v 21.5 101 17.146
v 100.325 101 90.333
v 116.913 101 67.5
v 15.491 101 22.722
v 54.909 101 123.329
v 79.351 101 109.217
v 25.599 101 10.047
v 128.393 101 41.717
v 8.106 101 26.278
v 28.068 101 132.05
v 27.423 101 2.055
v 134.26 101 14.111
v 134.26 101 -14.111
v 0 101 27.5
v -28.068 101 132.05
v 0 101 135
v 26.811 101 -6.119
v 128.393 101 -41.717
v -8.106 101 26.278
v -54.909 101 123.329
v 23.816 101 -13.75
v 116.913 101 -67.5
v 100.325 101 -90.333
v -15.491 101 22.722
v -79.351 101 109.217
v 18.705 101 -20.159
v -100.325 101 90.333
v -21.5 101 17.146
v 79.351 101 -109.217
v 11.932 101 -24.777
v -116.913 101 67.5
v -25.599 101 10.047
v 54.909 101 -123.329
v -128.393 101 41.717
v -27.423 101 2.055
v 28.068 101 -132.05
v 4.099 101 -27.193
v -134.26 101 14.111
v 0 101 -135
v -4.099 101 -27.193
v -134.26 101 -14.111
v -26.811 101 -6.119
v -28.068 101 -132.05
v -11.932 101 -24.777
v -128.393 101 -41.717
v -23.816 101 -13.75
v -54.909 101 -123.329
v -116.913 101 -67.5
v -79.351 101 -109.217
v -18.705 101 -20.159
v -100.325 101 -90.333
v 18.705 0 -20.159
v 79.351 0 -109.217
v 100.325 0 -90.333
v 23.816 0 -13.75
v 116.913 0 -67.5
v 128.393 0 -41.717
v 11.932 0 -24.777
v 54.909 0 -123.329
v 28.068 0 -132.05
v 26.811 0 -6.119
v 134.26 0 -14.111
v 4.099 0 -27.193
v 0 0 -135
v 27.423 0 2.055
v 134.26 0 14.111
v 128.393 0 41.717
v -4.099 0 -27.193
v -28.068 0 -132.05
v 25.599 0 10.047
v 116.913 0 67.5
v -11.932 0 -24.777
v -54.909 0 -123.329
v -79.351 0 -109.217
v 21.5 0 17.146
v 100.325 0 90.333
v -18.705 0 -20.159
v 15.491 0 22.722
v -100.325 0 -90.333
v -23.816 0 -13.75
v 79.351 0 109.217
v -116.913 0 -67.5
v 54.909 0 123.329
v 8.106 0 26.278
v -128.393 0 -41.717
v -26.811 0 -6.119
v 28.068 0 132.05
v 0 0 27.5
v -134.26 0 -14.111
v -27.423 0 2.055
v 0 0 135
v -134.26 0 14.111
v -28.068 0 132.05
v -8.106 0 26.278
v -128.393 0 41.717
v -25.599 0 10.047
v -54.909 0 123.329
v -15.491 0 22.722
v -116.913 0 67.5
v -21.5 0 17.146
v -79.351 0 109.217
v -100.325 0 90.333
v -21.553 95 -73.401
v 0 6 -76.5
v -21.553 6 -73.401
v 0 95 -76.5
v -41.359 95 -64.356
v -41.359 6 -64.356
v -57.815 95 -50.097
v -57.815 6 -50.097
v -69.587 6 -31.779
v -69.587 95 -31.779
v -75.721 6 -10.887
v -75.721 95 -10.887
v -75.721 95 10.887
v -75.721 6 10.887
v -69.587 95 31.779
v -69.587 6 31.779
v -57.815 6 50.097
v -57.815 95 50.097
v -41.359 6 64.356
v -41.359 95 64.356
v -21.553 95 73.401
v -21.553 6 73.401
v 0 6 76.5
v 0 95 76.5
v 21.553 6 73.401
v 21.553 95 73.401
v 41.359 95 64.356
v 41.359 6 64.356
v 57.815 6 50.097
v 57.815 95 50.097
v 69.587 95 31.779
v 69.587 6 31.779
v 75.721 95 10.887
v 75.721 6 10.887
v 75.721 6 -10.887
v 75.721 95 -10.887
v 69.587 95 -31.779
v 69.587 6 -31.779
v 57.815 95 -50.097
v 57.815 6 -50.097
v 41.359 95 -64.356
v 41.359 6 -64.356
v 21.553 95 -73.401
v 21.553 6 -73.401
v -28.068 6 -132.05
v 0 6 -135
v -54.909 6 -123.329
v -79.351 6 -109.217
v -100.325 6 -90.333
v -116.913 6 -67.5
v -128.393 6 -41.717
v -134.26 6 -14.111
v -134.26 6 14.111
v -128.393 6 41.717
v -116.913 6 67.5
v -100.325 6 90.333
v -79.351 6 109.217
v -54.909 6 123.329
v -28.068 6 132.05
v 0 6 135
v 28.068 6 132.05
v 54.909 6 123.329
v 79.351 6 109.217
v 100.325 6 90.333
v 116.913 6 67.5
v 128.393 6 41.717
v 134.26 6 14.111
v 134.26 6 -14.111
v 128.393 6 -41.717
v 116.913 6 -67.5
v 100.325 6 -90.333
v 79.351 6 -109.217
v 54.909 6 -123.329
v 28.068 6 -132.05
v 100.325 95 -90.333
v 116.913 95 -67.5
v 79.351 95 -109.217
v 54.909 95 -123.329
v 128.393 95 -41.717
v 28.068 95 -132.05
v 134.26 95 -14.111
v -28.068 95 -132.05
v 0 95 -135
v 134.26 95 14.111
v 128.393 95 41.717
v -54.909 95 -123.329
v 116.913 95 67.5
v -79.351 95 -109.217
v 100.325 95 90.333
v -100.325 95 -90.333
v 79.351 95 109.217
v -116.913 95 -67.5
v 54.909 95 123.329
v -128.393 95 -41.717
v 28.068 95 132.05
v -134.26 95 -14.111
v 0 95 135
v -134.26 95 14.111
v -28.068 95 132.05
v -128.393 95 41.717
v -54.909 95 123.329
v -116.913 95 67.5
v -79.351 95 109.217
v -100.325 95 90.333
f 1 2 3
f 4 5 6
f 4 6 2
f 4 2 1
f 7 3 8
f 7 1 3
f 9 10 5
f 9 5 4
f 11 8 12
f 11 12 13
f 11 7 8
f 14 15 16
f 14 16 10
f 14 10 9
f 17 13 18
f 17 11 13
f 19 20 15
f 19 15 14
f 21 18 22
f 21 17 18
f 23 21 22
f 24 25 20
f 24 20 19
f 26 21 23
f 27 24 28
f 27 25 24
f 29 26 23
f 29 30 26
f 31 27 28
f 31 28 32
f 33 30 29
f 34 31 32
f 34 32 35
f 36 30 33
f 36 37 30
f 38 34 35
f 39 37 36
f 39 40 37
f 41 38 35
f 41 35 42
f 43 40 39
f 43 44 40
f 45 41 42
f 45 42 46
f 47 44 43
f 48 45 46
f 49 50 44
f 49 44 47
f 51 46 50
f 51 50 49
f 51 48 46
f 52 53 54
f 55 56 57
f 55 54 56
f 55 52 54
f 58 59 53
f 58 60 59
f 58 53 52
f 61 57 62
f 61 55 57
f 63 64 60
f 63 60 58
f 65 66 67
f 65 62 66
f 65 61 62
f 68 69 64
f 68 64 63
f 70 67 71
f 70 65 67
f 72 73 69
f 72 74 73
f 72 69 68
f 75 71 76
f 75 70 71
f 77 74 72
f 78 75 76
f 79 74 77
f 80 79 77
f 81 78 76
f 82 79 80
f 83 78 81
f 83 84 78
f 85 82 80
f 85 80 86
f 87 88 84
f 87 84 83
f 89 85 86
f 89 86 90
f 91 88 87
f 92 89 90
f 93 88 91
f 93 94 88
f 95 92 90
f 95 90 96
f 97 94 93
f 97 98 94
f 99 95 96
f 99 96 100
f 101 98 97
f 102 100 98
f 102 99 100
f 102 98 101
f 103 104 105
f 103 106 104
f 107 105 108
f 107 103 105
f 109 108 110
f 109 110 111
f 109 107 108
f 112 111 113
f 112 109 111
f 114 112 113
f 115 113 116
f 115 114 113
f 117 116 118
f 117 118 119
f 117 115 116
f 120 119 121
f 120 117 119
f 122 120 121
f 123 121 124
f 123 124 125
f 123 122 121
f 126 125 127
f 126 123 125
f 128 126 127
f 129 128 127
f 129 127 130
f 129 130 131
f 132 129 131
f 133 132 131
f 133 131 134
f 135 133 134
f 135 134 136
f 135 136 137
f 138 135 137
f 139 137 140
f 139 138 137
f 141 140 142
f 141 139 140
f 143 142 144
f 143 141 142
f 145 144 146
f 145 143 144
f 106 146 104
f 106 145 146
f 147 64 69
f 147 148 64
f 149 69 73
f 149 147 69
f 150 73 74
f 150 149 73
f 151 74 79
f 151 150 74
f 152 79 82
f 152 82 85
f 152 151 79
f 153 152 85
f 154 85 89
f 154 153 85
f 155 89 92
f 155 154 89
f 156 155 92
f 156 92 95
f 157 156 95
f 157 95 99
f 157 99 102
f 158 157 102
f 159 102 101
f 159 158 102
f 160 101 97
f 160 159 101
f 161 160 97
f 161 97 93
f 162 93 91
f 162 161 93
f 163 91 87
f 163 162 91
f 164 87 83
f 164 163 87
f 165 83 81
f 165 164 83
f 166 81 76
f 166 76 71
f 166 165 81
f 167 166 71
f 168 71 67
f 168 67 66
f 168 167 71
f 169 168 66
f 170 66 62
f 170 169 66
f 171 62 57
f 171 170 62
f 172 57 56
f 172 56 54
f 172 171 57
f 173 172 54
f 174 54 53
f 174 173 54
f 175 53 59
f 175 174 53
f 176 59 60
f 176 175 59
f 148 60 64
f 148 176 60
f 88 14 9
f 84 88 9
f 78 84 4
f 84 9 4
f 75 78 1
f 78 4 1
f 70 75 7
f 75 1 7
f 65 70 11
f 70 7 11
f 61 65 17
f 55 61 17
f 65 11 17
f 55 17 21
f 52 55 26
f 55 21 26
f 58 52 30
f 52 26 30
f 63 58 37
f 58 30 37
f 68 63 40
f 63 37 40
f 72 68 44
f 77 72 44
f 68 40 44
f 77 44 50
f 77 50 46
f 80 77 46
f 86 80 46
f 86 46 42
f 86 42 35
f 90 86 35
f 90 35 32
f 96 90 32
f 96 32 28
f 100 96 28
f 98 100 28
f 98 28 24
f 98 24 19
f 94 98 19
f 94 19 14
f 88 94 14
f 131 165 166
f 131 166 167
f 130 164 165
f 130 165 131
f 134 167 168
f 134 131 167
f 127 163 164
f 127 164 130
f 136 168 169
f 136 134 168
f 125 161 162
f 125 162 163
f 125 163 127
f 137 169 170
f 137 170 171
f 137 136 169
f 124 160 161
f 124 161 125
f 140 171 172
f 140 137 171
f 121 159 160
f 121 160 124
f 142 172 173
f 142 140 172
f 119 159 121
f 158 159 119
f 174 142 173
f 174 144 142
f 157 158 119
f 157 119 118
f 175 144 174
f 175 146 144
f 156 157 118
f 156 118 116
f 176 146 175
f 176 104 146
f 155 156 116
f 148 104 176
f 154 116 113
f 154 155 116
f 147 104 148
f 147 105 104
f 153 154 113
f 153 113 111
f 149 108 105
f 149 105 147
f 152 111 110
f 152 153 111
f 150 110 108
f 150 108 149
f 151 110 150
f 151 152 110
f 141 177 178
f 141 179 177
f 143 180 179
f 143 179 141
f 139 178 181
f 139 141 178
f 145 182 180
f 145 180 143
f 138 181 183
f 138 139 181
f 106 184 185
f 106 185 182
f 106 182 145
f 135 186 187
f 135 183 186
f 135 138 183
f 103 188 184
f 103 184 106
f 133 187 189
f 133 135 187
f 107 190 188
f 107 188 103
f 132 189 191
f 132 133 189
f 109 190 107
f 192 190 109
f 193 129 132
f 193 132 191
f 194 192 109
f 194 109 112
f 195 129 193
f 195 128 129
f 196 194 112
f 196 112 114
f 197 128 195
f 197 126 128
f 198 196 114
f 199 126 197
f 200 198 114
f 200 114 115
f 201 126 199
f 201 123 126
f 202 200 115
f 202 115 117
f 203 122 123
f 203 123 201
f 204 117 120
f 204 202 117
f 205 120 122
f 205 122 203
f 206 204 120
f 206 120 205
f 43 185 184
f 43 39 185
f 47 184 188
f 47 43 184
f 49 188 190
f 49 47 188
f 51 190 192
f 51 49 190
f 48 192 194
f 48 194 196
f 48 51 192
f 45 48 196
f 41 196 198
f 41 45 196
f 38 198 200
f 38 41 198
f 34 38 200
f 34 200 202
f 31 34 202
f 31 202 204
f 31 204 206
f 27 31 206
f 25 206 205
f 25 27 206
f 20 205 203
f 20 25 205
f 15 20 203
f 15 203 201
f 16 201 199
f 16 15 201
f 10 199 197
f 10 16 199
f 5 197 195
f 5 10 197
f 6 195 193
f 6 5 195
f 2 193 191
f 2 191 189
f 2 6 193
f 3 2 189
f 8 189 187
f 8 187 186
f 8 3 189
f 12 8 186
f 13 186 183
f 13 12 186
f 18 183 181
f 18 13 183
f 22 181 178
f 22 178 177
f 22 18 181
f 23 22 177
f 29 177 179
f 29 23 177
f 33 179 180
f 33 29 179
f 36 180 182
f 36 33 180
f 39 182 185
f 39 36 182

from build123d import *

# Parameters (mm, degrees)
SKETCH2_R          = 27.5
CUT_EXTRUDE1_DEPTH = 260


with BuildPart() as part:
    # Sketch1 → Revolve1 (revolve)
    with BuildSketch(Plane.XY, mode=Mode.PRIVATE) as revolve1_sk:
        Polygon((-135, 95), (-135, 101), (0, 101), (0, 0), (-135, 0), (-135, 6), (-76.5, 6), (-76.5, 95), align=None)
    revolve(revolve1_sk.sketch.rotate(Axis((0, 0, 0), (0, 1, 0)), 270), axis=Axis((0, 0, 0), (0, 1, 0)))

    # Sketch2 → Cut-Extrude1 (cut)
    with BuildSketch(Plane(origin=(0, 101, 0), x_dir=(1, 0, 0), z_dir=(0, 1, 0))):
        with Locations(Location((0, 0, 0), (0, 0, 270))):
            Circle(SKETCH2_R)
    extrude(amount=-CUT_EXTRUDE1_DEPTH, mode=Mode.SUBTRACT)


solid = part.part
